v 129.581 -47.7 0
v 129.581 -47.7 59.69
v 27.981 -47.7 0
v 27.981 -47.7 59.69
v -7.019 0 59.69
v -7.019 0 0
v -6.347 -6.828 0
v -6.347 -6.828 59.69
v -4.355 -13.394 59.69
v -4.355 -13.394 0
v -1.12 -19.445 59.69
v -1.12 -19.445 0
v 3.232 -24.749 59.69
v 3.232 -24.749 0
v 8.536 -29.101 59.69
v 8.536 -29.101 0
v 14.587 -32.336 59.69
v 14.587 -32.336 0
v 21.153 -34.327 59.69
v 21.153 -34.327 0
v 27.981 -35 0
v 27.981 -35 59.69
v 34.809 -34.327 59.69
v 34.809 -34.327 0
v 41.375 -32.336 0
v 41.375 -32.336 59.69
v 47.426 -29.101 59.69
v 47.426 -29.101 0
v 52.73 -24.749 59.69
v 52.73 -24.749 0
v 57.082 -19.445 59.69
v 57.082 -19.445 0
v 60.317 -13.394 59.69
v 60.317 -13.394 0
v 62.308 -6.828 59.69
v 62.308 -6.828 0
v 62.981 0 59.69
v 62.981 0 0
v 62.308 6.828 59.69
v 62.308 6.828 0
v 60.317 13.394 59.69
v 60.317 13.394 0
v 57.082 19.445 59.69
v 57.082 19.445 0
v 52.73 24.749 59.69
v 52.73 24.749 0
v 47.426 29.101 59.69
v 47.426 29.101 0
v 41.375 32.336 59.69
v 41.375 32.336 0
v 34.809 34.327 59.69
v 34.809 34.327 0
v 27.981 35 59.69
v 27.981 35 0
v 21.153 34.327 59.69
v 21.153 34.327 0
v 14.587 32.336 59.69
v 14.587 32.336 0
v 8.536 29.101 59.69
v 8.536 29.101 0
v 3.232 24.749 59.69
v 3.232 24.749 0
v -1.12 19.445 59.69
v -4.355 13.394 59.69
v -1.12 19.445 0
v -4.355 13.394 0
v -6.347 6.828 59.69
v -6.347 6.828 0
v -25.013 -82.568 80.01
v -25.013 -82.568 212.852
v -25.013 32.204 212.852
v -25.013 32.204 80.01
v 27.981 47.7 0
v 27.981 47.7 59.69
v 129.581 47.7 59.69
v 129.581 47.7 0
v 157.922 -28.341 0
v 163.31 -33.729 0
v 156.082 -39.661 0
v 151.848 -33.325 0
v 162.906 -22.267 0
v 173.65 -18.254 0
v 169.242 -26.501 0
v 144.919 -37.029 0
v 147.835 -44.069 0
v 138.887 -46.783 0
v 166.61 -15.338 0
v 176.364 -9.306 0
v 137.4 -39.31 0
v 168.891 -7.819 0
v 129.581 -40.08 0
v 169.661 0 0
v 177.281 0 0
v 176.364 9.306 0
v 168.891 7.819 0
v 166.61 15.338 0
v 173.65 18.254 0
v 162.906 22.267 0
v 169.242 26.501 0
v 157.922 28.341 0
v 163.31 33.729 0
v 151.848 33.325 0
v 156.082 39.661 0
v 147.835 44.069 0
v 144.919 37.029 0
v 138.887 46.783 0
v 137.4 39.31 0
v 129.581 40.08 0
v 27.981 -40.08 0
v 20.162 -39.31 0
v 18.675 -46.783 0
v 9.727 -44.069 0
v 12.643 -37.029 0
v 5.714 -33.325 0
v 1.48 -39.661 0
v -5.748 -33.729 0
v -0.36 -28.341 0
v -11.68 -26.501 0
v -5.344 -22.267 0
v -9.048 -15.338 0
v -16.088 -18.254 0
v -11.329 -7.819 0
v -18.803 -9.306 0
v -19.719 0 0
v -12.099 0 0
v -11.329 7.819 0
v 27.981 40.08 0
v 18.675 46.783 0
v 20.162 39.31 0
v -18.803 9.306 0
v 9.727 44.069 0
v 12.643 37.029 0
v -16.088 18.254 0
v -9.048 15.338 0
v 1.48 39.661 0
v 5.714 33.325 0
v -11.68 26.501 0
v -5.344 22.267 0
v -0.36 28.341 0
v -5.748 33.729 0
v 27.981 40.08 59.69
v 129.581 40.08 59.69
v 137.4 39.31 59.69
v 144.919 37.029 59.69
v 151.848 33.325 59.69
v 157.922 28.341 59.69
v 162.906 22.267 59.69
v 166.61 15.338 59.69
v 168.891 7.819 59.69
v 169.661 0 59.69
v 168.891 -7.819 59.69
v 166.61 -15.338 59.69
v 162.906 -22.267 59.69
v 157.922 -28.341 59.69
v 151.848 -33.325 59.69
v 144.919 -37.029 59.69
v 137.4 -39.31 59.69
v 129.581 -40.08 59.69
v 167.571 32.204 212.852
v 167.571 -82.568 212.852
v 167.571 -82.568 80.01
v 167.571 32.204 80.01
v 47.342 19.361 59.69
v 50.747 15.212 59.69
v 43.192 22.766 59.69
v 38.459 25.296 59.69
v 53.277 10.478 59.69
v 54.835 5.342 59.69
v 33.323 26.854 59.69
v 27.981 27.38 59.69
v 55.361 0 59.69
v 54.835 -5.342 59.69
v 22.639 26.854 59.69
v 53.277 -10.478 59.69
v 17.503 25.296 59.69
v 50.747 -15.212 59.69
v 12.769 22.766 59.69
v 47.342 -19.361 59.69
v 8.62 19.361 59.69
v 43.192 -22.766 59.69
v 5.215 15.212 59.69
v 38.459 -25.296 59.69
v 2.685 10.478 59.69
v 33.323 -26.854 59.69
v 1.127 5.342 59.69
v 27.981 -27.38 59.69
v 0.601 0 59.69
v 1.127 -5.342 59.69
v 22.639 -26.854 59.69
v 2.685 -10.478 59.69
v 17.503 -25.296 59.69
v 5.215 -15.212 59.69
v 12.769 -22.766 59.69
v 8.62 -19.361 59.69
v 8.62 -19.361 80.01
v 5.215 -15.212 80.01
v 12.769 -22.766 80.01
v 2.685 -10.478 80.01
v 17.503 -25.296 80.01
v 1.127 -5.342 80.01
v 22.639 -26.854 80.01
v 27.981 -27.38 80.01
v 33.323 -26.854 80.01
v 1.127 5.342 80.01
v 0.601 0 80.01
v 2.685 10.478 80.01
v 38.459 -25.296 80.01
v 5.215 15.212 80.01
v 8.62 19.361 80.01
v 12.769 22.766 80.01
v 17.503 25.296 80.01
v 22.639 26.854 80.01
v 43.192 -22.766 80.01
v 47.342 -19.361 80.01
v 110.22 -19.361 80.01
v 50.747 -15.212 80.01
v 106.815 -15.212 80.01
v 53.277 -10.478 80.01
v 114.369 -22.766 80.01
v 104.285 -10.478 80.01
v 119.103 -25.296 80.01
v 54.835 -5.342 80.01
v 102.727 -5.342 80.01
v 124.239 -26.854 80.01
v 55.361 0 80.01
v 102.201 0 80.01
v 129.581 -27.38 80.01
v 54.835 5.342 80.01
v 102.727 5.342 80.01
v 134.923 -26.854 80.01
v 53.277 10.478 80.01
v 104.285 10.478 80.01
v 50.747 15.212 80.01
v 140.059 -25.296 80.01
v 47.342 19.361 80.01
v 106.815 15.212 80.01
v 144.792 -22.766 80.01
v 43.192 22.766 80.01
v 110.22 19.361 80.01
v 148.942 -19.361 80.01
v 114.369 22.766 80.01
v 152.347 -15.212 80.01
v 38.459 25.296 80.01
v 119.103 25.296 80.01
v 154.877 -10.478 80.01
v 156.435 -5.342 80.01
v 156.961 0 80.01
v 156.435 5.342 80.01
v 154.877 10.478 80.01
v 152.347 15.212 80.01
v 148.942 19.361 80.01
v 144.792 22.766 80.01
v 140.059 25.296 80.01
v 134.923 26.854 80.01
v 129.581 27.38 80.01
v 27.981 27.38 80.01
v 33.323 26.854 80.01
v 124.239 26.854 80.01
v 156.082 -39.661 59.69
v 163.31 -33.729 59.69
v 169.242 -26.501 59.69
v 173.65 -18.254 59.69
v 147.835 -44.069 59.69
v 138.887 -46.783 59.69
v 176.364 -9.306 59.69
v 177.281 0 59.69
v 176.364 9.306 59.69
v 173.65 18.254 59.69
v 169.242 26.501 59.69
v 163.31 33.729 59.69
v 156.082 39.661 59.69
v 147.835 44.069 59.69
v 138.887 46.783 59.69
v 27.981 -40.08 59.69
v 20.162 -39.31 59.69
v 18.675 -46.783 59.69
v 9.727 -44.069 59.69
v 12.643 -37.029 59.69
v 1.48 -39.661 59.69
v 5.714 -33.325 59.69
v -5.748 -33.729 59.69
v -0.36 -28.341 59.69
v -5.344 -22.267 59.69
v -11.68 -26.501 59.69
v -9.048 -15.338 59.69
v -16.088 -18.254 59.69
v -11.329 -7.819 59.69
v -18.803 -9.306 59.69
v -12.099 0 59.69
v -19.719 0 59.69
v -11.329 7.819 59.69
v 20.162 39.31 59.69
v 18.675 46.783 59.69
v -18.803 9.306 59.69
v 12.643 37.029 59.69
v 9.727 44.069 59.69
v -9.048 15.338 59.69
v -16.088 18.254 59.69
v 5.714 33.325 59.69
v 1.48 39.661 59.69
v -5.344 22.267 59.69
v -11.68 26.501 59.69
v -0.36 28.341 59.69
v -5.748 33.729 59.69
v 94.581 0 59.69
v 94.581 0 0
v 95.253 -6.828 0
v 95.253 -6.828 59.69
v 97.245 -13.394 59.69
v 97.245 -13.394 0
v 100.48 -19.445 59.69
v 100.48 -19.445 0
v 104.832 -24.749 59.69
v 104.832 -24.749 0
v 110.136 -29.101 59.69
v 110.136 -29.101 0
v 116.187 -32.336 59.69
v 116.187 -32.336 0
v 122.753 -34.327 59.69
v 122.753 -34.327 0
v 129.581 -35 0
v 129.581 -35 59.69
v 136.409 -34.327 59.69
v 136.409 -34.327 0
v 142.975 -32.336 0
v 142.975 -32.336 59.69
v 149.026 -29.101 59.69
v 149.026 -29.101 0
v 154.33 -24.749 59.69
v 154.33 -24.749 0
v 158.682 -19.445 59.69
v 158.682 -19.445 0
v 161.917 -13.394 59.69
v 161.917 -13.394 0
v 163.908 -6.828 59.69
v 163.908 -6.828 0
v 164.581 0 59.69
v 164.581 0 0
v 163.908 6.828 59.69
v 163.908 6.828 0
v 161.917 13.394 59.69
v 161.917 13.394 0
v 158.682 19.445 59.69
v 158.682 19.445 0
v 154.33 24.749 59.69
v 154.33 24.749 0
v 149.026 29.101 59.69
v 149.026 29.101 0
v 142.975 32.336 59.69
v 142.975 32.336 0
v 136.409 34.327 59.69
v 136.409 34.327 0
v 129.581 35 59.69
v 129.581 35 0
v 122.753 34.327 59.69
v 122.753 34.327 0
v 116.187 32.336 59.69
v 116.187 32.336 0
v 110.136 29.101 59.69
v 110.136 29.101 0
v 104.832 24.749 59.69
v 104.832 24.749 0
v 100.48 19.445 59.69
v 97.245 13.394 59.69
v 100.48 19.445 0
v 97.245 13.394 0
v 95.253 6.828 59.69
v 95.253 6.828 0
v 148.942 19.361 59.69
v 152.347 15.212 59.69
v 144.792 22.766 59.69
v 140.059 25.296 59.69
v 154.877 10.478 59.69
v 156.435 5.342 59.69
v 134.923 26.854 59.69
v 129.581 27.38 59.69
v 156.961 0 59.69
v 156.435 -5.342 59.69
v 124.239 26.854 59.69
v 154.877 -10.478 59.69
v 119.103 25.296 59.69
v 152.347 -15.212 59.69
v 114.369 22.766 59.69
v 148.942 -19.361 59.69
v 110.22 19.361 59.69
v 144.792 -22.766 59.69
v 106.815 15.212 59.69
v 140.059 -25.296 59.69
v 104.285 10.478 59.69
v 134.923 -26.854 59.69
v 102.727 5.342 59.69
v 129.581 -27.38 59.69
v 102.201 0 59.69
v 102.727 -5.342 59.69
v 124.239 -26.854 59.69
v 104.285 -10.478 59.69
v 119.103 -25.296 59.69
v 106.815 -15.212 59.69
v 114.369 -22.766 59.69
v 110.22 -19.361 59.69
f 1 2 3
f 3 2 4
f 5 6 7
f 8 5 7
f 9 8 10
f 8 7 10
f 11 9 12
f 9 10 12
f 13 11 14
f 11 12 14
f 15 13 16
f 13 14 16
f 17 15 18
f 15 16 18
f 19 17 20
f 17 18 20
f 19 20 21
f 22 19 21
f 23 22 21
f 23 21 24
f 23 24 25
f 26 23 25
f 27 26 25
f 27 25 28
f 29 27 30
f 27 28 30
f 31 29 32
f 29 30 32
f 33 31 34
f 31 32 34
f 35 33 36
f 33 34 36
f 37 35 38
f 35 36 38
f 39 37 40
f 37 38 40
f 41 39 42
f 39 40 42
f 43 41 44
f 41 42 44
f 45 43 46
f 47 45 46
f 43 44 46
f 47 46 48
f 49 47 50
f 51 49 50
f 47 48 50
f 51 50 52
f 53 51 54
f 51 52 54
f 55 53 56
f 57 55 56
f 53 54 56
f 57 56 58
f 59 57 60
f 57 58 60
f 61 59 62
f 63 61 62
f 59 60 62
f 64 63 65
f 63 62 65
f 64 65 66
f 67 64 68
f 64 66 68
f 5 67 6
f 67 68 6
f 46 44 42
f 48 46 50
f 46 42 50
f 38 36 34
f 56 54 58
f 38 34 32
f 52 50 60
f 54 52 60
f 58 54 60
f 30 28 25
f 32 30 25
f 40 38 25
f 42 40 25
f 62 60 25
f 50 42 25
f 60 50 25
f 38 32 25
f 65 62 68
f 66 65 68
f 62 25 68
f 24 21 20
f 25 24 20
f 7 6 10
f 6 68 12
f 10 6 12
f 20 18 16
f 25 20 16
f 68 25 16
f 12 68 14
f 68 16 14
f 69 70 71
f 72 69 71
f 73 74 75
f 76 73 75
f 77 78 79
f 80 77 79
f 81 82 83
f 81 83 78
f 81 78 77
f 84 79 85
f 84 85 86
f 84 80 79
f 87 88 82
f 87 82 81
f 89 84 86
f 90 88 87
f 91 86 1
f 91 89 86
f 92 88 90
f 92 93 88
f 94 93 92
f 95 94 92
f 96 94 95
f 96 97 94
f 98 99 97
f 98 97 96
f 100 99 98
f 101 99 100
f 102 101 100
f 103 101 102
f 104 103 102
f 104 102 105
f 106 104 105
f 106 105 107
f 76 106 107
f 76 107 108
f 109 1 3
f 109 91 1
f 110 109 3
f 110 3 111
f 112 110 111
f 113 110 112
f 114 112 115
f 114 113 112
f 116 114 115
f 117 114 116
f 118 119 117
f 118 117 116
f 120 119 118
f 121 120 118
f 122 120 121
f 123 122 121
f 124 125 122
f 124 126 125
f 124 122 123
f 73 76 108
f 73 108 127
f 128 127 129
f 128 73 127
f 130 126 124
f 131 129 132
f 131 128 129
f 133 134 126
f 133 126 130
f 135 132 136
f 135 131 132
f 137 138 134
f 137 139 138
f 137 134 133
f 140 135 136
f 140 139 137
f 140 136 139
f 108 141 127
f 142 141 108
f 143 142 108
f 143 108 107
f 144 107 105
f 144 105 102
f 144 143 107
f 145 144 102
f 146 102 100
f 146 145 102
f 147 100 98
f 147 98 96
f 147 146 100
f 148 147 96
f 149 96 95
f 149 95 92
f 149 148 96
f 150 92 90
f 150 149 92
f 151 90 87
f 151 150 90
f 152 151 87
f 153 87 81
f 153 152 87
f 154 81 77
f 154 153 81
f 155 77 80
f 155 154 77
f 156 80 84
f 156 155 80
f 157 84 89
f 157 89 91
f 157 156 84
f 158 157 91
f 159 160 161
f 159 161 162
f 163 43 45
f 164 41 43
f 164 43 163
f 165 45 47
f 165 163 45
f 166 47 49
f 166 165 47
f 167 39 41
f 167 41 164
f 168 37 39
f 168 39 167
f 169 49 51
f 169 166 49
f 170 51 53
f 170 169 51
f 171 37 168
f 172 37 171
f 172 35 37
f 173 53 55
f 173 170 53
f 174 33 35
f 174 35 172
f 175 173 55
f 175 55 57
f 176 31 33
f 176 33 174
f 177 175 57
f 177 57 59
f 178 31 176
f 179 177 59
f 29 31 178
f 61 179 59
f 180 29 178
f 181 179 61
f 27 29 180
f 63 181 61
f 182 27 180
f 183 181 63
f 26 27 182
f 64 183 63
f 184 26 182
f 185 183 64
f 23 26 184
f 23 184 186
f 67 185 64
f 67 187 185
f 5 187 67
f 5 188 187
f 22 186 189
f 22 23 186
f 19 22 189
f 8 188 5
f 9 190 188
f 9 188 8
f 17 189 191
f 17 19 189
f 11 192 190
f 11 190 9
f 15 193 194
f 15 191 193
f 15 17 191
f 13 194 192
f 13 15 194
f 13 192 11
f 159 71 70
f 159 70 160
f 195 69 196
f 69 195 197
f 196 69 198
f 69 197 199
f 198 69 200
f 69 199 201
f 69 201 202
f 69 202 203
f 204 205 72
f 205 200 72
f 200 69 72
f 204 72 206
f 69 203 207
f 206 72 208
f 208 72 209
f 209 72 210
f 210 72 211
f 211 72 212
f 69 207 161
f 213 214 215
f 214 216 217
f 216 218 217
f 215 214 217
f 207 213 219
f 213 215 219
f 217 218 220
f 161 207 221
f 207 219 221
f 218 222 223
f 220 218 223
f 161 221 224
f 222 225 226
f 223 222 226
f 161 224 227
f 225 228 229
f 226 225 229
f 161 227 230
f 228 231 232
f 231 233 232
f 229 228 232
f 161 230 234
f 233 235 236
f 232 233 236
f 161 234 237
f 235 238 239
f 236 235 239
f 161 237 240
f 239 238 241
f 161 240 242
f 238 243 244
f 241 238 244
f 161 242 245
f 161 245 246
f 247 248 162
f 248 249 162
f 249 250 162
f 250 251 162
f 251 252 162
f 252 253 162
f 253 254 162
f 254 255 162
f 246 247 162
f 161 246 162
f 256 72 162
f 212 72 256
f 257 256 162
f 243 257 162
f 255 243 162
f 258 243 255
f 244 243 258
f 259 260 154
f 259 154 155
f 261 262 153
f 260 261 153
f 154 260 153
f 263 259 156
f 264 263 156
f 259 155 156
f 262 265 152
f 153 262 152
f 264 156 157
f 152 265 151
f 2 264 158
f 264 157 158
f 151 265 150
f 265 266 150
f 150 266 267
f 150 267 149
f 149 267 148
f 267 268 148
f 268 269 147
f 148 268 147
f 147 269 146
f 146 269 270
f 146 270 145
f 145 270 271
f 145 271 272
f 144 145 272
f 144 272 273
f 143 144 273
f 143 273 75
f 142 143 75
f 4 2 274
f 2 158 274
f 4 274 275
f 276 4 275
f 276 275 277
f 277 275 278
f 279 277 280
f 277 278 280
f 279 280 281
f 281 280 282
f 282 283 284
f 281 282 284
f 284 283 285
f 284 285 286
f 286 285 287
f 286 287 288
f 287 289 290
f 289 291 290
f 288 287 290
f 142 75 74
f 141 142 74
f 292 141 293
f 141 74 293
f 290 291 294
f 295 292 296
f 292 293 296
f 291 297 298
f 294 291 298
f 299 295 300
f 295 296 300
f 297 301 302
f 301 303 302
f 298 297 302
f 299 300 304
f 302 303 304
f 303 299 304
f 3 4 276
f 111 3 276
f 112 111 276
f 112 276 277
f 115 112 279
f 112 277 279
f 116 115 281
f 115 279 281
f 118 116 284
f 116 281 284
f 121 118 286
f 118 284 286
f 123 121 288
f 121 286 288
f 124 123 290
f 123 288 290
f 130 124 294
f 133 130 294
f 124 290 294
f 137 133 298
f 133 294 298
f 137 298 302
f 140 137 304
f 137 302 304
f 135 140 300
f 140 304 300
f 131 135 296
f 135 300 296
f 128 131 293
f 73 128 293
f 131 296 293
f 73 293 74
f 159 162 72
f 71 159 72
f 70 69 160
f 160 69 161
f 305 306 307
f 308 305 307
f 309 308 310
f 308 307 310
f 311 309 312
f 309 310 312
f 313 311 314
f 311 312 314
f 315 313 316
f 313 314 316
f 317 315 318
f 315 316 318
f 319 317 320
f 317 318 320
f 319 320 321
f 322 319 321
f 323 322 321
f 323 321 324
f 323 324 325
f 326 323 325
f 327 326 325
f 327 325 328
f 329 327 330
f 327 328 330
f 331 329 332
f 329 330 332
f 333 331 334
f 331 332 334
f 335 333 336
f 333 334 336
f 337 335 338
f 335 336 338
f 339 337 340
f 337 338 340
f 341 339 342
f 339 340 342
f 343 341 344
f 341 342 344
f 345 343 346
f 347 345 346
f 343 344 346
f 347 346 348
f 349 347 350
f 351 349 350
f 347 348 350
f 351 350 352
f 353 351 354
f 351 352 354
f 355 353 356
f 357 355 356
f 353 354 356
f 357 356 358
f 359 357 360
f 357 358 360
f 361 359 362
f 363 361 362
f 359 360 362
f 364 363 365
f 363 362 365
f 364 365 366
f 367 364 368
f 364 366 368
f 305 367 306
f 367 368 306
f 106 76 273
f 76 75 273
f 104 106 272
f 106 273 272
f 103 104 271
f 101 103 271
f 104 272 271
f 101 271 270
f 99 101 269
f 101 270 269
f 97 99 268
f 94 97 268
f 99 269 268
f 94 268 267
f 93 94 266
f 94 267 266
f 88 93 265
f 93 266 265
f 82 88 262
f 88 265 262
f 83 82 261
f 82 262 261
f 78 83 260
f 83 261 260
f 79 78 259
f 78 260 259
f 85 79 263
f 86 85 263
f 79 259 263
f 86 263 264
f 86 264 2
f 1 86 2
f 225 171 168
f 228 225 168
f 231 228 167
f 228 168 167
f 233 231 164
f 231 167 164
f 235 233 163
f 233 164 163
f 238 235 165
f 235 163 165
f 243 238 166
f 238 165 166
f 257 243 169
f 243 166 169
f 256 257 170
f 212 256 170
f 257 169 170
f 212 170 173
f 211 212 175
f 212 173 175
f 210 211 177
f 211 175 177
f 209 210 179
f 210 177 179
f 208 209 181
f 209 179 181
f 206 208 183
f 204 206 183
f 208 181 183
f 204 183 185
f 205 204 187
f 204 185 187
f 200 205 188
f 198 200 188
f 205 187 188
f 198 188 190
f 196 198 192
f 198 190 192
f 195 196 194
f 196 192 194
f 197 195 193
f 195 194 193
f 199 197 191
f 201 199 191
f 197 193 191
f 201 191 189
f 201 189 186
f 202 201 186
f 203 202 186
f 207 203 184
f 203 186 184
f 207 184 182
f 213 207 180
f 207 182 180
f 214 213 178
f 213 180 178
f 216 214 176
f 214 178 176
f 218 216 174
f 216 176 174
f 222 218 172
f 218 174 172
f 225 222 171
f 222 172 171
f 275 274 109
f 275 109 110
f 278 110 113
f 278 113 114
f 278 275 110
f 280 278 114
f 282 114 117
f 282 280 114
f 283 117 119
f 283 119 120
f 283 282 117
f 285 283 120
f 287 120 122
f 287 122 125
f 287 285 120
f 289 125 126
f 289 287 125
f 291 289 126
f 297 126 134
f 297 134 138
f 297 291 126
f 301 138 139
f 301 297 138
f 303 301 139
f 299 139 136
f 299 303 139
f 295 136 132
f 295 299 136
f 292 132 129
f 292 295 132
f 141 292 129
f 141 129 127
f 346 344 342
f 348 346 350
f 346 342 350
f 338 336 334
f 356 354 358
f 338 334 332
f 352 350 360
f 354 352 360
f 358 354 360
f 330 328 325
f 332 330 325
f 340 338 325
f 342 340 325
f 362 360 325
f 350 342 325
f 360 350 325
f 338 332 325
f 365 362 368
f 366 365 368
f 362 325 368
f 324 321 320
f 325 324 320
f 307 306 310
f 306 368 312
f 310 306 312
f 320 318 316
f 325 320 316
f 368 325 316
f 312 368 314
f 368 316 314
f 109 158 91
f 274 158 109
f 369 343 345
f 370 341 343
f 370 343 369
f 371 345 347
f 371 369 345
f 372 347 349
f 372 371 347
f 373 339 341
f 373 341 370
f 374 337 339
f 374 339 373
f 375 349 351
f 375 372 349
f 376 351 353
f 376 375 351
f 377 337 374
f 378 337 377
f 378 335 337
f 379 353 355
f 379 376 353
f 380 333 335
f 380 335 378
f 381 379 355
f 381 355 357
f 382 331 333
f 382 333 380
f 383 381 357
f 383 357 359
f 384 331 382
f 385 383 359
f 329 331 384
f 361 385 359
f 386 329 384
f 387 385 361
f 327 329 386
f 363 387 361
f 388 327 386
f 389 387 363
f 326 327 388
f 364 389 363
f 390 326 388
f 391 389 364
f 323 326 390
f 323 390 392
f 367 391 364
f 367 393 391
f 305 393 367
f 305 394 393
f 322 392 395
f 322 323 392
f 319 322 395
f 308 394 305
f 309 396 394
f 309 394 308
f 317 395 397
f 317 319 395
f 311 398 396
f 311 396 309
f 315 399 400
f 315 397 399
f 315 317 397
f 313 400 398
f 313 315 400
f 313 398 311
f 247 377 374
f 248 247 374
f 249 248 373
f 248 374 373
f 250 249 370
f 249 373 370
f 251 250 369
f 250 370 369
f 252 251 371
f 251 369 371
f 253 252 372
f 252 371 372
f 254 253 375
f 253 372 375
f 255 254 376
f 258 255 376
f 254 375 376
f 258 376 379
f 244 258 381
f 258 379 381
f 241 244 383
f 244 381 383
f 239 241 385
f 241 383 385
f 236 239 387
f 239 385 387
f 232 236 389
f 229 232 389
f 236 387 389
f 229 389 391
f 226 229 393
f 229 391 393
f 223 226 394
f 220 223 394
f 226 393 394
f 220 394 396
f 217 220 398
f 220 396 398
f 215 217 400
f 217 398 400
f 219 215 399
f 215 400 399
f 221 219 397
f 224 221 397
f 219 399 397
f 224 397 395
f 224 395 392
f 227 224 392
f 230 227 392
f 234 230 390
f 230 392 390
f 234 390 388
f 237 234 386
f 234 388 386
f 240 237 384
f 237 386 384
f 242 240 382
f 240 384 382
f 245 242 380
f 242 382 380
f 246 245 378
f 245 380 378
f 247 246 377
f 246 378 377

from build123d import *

# Parameters (mm, degrees)
SKETCH_1_R          = 35
EXTRUDE_1_DEPTH     = 59.69
EXTRUDE_1_2_DEPTH   = 59.69
EXTRUDE_1_3_DEPTH   = 59.69
EXTRUDE_2_DEPTH     = 29.845
SKETCH_3_R          = 27.38
EXTRUDE_3_DEPTH     = 20.32
EXTRUDE_4_DEPTH     = 132.842
SKETCH_5_R          = 35
CUT_EXTRUDE_1_DEPTH = 80.01
SKETCH_6_W          = 119.203563449
SKETCH_6_H          = 165.430142189
CUT_EXTRUDE_2_DEPTH = 171.704


with BuildPart() as part:
    # 草图1 → 凸台-拉伸1 (new body)
    with BuildSketch(Plane.XY):
        with Locations(Location((-73.619052145, 0, 0), (0, 0, 180))):
            Circle(SKETCH_1_R)
    extrude(amount=EXTRUDE_1_DEPTH)



with BuildPart() as body_2:
    # 草图1 → Extrude 1 2 (new body)
    with BuildSketch(Plane.XY):
        with Locations(Location((27.980947855, 0, 0), (0, 0, 180))):
            Circle(SKETCH_1_R)
    extrude(amount=EXTRUDE_1_2_DEPTH)


with BuildPart() as body_3:
    # 草图1 → Extrude 1 3 (new body)
    with BuildSketch(Plane.XY):
        with Locations(Location((129.580947855, 0, 0), (0, 0, 180))):
            Circle(SKETCH_1_R)
    extrude(amount=EXTRUDE_1_3_DEPTH)


with BuildPart() as body_4:
    # 草图2 → 凸台-拉伸2 (new, symmetric)
    with BuildSketch(Plane.XY.offset(29.845)):
        with BuildLine():
            Line((27.980947855, 47.7), (129.580947855, 47.7))
            ThreePointArc((129.580947855, 47.7), (177.280947855, 0), (129.580947855, -47.7))
            Line((129.580947855, -47.7), (27.980947855, -47.7))
            ThreePointArc((27.980947855, -47.7), (-19.719052145, 0), (27.980947855, 47.7))
        make_face()
        with BuildLine():
            Line((27.980947855, 40.08), (129.580947855, 40.08))
            ThreePointArc((129.580947855, 40.08), (169.660947855, 0), (129.580947855, -40.08))
            Line((129.580947855, -40.08), (27.980947855, -40.08))
            ThreePointArc((27.980947855, -40.08), (-12.099052145, 0), (27.980947855, 40.08))
        make_face(mode=Mode.SUBTRACT)
    extrude(amount=EXTRUDE_2_DEPTH, both=True)


with BuildPart() as part_1:
    add(part.part)

    add(body_2.part)  # 凸台-拉伸3 merges body 2

    add(body_3.part)  # 凸台-拉伸3 merges body 3
    # 草图3 → 凸台-拉伸3 (add)
    with BuildSketch(Plane.XY.offset(59.69)):
        with Locations((129.580947855, 0)):
            Circle(SKETCH_3_R)
        with Locations((-73.619052145, 0)):
            Circle(SKETCH_3_R)
        with Locations((27.980947855, 0)):
            Circle(SKETCH_3_R)
    extrude(amount=EXTRUDE_3_DEPTH)

    # 草图4 → 凸台-拉伸4 (add)
    with BuildSketch(Plane.XY.offset(80.01)):
        Polygon((-112.093411713, 0), (-112.093411713, -82.567600022), (167.571039974, -82.567600022), (167.571039974, 0), (167.571039974, 32.203785346), (-112.093411713, 32.203785346), align=None)
    extrude(amount=EXTRUDE_4_DEPTH)

    # 草图5 → 切除-拉伸1 (cut)
    with BuildSketch(Plane(origin=(0, 0, 0), x_dir=(-1, 0, 0), z_dir=(0, 0, -1))):
        with Locations((73.619052145, 0)):
            Circle(SKETCH_5_R)
    extrude(amount=-CUT_EXTRUDE_1_DEPTH, mode=Mode.SUBTRACT)

    # 草图6 → 切除-拉伸2 (cut)
    with BuildSketch(Plane(origin=(0, 0, 80.01), x_dir=(-1, 0, 0), z_dir=(0, 0, -1))):
        with Locations((84.615247565, -29.518413235)):
            Rectangle(SKETCH_6_W, SKETCH_6_H)
    extrude(amount=-CUT_EXTRUDE_2_DEPTH, mode=Mode.SUBTRACT)


solid = Compound([body_4.part, part_1.part])
